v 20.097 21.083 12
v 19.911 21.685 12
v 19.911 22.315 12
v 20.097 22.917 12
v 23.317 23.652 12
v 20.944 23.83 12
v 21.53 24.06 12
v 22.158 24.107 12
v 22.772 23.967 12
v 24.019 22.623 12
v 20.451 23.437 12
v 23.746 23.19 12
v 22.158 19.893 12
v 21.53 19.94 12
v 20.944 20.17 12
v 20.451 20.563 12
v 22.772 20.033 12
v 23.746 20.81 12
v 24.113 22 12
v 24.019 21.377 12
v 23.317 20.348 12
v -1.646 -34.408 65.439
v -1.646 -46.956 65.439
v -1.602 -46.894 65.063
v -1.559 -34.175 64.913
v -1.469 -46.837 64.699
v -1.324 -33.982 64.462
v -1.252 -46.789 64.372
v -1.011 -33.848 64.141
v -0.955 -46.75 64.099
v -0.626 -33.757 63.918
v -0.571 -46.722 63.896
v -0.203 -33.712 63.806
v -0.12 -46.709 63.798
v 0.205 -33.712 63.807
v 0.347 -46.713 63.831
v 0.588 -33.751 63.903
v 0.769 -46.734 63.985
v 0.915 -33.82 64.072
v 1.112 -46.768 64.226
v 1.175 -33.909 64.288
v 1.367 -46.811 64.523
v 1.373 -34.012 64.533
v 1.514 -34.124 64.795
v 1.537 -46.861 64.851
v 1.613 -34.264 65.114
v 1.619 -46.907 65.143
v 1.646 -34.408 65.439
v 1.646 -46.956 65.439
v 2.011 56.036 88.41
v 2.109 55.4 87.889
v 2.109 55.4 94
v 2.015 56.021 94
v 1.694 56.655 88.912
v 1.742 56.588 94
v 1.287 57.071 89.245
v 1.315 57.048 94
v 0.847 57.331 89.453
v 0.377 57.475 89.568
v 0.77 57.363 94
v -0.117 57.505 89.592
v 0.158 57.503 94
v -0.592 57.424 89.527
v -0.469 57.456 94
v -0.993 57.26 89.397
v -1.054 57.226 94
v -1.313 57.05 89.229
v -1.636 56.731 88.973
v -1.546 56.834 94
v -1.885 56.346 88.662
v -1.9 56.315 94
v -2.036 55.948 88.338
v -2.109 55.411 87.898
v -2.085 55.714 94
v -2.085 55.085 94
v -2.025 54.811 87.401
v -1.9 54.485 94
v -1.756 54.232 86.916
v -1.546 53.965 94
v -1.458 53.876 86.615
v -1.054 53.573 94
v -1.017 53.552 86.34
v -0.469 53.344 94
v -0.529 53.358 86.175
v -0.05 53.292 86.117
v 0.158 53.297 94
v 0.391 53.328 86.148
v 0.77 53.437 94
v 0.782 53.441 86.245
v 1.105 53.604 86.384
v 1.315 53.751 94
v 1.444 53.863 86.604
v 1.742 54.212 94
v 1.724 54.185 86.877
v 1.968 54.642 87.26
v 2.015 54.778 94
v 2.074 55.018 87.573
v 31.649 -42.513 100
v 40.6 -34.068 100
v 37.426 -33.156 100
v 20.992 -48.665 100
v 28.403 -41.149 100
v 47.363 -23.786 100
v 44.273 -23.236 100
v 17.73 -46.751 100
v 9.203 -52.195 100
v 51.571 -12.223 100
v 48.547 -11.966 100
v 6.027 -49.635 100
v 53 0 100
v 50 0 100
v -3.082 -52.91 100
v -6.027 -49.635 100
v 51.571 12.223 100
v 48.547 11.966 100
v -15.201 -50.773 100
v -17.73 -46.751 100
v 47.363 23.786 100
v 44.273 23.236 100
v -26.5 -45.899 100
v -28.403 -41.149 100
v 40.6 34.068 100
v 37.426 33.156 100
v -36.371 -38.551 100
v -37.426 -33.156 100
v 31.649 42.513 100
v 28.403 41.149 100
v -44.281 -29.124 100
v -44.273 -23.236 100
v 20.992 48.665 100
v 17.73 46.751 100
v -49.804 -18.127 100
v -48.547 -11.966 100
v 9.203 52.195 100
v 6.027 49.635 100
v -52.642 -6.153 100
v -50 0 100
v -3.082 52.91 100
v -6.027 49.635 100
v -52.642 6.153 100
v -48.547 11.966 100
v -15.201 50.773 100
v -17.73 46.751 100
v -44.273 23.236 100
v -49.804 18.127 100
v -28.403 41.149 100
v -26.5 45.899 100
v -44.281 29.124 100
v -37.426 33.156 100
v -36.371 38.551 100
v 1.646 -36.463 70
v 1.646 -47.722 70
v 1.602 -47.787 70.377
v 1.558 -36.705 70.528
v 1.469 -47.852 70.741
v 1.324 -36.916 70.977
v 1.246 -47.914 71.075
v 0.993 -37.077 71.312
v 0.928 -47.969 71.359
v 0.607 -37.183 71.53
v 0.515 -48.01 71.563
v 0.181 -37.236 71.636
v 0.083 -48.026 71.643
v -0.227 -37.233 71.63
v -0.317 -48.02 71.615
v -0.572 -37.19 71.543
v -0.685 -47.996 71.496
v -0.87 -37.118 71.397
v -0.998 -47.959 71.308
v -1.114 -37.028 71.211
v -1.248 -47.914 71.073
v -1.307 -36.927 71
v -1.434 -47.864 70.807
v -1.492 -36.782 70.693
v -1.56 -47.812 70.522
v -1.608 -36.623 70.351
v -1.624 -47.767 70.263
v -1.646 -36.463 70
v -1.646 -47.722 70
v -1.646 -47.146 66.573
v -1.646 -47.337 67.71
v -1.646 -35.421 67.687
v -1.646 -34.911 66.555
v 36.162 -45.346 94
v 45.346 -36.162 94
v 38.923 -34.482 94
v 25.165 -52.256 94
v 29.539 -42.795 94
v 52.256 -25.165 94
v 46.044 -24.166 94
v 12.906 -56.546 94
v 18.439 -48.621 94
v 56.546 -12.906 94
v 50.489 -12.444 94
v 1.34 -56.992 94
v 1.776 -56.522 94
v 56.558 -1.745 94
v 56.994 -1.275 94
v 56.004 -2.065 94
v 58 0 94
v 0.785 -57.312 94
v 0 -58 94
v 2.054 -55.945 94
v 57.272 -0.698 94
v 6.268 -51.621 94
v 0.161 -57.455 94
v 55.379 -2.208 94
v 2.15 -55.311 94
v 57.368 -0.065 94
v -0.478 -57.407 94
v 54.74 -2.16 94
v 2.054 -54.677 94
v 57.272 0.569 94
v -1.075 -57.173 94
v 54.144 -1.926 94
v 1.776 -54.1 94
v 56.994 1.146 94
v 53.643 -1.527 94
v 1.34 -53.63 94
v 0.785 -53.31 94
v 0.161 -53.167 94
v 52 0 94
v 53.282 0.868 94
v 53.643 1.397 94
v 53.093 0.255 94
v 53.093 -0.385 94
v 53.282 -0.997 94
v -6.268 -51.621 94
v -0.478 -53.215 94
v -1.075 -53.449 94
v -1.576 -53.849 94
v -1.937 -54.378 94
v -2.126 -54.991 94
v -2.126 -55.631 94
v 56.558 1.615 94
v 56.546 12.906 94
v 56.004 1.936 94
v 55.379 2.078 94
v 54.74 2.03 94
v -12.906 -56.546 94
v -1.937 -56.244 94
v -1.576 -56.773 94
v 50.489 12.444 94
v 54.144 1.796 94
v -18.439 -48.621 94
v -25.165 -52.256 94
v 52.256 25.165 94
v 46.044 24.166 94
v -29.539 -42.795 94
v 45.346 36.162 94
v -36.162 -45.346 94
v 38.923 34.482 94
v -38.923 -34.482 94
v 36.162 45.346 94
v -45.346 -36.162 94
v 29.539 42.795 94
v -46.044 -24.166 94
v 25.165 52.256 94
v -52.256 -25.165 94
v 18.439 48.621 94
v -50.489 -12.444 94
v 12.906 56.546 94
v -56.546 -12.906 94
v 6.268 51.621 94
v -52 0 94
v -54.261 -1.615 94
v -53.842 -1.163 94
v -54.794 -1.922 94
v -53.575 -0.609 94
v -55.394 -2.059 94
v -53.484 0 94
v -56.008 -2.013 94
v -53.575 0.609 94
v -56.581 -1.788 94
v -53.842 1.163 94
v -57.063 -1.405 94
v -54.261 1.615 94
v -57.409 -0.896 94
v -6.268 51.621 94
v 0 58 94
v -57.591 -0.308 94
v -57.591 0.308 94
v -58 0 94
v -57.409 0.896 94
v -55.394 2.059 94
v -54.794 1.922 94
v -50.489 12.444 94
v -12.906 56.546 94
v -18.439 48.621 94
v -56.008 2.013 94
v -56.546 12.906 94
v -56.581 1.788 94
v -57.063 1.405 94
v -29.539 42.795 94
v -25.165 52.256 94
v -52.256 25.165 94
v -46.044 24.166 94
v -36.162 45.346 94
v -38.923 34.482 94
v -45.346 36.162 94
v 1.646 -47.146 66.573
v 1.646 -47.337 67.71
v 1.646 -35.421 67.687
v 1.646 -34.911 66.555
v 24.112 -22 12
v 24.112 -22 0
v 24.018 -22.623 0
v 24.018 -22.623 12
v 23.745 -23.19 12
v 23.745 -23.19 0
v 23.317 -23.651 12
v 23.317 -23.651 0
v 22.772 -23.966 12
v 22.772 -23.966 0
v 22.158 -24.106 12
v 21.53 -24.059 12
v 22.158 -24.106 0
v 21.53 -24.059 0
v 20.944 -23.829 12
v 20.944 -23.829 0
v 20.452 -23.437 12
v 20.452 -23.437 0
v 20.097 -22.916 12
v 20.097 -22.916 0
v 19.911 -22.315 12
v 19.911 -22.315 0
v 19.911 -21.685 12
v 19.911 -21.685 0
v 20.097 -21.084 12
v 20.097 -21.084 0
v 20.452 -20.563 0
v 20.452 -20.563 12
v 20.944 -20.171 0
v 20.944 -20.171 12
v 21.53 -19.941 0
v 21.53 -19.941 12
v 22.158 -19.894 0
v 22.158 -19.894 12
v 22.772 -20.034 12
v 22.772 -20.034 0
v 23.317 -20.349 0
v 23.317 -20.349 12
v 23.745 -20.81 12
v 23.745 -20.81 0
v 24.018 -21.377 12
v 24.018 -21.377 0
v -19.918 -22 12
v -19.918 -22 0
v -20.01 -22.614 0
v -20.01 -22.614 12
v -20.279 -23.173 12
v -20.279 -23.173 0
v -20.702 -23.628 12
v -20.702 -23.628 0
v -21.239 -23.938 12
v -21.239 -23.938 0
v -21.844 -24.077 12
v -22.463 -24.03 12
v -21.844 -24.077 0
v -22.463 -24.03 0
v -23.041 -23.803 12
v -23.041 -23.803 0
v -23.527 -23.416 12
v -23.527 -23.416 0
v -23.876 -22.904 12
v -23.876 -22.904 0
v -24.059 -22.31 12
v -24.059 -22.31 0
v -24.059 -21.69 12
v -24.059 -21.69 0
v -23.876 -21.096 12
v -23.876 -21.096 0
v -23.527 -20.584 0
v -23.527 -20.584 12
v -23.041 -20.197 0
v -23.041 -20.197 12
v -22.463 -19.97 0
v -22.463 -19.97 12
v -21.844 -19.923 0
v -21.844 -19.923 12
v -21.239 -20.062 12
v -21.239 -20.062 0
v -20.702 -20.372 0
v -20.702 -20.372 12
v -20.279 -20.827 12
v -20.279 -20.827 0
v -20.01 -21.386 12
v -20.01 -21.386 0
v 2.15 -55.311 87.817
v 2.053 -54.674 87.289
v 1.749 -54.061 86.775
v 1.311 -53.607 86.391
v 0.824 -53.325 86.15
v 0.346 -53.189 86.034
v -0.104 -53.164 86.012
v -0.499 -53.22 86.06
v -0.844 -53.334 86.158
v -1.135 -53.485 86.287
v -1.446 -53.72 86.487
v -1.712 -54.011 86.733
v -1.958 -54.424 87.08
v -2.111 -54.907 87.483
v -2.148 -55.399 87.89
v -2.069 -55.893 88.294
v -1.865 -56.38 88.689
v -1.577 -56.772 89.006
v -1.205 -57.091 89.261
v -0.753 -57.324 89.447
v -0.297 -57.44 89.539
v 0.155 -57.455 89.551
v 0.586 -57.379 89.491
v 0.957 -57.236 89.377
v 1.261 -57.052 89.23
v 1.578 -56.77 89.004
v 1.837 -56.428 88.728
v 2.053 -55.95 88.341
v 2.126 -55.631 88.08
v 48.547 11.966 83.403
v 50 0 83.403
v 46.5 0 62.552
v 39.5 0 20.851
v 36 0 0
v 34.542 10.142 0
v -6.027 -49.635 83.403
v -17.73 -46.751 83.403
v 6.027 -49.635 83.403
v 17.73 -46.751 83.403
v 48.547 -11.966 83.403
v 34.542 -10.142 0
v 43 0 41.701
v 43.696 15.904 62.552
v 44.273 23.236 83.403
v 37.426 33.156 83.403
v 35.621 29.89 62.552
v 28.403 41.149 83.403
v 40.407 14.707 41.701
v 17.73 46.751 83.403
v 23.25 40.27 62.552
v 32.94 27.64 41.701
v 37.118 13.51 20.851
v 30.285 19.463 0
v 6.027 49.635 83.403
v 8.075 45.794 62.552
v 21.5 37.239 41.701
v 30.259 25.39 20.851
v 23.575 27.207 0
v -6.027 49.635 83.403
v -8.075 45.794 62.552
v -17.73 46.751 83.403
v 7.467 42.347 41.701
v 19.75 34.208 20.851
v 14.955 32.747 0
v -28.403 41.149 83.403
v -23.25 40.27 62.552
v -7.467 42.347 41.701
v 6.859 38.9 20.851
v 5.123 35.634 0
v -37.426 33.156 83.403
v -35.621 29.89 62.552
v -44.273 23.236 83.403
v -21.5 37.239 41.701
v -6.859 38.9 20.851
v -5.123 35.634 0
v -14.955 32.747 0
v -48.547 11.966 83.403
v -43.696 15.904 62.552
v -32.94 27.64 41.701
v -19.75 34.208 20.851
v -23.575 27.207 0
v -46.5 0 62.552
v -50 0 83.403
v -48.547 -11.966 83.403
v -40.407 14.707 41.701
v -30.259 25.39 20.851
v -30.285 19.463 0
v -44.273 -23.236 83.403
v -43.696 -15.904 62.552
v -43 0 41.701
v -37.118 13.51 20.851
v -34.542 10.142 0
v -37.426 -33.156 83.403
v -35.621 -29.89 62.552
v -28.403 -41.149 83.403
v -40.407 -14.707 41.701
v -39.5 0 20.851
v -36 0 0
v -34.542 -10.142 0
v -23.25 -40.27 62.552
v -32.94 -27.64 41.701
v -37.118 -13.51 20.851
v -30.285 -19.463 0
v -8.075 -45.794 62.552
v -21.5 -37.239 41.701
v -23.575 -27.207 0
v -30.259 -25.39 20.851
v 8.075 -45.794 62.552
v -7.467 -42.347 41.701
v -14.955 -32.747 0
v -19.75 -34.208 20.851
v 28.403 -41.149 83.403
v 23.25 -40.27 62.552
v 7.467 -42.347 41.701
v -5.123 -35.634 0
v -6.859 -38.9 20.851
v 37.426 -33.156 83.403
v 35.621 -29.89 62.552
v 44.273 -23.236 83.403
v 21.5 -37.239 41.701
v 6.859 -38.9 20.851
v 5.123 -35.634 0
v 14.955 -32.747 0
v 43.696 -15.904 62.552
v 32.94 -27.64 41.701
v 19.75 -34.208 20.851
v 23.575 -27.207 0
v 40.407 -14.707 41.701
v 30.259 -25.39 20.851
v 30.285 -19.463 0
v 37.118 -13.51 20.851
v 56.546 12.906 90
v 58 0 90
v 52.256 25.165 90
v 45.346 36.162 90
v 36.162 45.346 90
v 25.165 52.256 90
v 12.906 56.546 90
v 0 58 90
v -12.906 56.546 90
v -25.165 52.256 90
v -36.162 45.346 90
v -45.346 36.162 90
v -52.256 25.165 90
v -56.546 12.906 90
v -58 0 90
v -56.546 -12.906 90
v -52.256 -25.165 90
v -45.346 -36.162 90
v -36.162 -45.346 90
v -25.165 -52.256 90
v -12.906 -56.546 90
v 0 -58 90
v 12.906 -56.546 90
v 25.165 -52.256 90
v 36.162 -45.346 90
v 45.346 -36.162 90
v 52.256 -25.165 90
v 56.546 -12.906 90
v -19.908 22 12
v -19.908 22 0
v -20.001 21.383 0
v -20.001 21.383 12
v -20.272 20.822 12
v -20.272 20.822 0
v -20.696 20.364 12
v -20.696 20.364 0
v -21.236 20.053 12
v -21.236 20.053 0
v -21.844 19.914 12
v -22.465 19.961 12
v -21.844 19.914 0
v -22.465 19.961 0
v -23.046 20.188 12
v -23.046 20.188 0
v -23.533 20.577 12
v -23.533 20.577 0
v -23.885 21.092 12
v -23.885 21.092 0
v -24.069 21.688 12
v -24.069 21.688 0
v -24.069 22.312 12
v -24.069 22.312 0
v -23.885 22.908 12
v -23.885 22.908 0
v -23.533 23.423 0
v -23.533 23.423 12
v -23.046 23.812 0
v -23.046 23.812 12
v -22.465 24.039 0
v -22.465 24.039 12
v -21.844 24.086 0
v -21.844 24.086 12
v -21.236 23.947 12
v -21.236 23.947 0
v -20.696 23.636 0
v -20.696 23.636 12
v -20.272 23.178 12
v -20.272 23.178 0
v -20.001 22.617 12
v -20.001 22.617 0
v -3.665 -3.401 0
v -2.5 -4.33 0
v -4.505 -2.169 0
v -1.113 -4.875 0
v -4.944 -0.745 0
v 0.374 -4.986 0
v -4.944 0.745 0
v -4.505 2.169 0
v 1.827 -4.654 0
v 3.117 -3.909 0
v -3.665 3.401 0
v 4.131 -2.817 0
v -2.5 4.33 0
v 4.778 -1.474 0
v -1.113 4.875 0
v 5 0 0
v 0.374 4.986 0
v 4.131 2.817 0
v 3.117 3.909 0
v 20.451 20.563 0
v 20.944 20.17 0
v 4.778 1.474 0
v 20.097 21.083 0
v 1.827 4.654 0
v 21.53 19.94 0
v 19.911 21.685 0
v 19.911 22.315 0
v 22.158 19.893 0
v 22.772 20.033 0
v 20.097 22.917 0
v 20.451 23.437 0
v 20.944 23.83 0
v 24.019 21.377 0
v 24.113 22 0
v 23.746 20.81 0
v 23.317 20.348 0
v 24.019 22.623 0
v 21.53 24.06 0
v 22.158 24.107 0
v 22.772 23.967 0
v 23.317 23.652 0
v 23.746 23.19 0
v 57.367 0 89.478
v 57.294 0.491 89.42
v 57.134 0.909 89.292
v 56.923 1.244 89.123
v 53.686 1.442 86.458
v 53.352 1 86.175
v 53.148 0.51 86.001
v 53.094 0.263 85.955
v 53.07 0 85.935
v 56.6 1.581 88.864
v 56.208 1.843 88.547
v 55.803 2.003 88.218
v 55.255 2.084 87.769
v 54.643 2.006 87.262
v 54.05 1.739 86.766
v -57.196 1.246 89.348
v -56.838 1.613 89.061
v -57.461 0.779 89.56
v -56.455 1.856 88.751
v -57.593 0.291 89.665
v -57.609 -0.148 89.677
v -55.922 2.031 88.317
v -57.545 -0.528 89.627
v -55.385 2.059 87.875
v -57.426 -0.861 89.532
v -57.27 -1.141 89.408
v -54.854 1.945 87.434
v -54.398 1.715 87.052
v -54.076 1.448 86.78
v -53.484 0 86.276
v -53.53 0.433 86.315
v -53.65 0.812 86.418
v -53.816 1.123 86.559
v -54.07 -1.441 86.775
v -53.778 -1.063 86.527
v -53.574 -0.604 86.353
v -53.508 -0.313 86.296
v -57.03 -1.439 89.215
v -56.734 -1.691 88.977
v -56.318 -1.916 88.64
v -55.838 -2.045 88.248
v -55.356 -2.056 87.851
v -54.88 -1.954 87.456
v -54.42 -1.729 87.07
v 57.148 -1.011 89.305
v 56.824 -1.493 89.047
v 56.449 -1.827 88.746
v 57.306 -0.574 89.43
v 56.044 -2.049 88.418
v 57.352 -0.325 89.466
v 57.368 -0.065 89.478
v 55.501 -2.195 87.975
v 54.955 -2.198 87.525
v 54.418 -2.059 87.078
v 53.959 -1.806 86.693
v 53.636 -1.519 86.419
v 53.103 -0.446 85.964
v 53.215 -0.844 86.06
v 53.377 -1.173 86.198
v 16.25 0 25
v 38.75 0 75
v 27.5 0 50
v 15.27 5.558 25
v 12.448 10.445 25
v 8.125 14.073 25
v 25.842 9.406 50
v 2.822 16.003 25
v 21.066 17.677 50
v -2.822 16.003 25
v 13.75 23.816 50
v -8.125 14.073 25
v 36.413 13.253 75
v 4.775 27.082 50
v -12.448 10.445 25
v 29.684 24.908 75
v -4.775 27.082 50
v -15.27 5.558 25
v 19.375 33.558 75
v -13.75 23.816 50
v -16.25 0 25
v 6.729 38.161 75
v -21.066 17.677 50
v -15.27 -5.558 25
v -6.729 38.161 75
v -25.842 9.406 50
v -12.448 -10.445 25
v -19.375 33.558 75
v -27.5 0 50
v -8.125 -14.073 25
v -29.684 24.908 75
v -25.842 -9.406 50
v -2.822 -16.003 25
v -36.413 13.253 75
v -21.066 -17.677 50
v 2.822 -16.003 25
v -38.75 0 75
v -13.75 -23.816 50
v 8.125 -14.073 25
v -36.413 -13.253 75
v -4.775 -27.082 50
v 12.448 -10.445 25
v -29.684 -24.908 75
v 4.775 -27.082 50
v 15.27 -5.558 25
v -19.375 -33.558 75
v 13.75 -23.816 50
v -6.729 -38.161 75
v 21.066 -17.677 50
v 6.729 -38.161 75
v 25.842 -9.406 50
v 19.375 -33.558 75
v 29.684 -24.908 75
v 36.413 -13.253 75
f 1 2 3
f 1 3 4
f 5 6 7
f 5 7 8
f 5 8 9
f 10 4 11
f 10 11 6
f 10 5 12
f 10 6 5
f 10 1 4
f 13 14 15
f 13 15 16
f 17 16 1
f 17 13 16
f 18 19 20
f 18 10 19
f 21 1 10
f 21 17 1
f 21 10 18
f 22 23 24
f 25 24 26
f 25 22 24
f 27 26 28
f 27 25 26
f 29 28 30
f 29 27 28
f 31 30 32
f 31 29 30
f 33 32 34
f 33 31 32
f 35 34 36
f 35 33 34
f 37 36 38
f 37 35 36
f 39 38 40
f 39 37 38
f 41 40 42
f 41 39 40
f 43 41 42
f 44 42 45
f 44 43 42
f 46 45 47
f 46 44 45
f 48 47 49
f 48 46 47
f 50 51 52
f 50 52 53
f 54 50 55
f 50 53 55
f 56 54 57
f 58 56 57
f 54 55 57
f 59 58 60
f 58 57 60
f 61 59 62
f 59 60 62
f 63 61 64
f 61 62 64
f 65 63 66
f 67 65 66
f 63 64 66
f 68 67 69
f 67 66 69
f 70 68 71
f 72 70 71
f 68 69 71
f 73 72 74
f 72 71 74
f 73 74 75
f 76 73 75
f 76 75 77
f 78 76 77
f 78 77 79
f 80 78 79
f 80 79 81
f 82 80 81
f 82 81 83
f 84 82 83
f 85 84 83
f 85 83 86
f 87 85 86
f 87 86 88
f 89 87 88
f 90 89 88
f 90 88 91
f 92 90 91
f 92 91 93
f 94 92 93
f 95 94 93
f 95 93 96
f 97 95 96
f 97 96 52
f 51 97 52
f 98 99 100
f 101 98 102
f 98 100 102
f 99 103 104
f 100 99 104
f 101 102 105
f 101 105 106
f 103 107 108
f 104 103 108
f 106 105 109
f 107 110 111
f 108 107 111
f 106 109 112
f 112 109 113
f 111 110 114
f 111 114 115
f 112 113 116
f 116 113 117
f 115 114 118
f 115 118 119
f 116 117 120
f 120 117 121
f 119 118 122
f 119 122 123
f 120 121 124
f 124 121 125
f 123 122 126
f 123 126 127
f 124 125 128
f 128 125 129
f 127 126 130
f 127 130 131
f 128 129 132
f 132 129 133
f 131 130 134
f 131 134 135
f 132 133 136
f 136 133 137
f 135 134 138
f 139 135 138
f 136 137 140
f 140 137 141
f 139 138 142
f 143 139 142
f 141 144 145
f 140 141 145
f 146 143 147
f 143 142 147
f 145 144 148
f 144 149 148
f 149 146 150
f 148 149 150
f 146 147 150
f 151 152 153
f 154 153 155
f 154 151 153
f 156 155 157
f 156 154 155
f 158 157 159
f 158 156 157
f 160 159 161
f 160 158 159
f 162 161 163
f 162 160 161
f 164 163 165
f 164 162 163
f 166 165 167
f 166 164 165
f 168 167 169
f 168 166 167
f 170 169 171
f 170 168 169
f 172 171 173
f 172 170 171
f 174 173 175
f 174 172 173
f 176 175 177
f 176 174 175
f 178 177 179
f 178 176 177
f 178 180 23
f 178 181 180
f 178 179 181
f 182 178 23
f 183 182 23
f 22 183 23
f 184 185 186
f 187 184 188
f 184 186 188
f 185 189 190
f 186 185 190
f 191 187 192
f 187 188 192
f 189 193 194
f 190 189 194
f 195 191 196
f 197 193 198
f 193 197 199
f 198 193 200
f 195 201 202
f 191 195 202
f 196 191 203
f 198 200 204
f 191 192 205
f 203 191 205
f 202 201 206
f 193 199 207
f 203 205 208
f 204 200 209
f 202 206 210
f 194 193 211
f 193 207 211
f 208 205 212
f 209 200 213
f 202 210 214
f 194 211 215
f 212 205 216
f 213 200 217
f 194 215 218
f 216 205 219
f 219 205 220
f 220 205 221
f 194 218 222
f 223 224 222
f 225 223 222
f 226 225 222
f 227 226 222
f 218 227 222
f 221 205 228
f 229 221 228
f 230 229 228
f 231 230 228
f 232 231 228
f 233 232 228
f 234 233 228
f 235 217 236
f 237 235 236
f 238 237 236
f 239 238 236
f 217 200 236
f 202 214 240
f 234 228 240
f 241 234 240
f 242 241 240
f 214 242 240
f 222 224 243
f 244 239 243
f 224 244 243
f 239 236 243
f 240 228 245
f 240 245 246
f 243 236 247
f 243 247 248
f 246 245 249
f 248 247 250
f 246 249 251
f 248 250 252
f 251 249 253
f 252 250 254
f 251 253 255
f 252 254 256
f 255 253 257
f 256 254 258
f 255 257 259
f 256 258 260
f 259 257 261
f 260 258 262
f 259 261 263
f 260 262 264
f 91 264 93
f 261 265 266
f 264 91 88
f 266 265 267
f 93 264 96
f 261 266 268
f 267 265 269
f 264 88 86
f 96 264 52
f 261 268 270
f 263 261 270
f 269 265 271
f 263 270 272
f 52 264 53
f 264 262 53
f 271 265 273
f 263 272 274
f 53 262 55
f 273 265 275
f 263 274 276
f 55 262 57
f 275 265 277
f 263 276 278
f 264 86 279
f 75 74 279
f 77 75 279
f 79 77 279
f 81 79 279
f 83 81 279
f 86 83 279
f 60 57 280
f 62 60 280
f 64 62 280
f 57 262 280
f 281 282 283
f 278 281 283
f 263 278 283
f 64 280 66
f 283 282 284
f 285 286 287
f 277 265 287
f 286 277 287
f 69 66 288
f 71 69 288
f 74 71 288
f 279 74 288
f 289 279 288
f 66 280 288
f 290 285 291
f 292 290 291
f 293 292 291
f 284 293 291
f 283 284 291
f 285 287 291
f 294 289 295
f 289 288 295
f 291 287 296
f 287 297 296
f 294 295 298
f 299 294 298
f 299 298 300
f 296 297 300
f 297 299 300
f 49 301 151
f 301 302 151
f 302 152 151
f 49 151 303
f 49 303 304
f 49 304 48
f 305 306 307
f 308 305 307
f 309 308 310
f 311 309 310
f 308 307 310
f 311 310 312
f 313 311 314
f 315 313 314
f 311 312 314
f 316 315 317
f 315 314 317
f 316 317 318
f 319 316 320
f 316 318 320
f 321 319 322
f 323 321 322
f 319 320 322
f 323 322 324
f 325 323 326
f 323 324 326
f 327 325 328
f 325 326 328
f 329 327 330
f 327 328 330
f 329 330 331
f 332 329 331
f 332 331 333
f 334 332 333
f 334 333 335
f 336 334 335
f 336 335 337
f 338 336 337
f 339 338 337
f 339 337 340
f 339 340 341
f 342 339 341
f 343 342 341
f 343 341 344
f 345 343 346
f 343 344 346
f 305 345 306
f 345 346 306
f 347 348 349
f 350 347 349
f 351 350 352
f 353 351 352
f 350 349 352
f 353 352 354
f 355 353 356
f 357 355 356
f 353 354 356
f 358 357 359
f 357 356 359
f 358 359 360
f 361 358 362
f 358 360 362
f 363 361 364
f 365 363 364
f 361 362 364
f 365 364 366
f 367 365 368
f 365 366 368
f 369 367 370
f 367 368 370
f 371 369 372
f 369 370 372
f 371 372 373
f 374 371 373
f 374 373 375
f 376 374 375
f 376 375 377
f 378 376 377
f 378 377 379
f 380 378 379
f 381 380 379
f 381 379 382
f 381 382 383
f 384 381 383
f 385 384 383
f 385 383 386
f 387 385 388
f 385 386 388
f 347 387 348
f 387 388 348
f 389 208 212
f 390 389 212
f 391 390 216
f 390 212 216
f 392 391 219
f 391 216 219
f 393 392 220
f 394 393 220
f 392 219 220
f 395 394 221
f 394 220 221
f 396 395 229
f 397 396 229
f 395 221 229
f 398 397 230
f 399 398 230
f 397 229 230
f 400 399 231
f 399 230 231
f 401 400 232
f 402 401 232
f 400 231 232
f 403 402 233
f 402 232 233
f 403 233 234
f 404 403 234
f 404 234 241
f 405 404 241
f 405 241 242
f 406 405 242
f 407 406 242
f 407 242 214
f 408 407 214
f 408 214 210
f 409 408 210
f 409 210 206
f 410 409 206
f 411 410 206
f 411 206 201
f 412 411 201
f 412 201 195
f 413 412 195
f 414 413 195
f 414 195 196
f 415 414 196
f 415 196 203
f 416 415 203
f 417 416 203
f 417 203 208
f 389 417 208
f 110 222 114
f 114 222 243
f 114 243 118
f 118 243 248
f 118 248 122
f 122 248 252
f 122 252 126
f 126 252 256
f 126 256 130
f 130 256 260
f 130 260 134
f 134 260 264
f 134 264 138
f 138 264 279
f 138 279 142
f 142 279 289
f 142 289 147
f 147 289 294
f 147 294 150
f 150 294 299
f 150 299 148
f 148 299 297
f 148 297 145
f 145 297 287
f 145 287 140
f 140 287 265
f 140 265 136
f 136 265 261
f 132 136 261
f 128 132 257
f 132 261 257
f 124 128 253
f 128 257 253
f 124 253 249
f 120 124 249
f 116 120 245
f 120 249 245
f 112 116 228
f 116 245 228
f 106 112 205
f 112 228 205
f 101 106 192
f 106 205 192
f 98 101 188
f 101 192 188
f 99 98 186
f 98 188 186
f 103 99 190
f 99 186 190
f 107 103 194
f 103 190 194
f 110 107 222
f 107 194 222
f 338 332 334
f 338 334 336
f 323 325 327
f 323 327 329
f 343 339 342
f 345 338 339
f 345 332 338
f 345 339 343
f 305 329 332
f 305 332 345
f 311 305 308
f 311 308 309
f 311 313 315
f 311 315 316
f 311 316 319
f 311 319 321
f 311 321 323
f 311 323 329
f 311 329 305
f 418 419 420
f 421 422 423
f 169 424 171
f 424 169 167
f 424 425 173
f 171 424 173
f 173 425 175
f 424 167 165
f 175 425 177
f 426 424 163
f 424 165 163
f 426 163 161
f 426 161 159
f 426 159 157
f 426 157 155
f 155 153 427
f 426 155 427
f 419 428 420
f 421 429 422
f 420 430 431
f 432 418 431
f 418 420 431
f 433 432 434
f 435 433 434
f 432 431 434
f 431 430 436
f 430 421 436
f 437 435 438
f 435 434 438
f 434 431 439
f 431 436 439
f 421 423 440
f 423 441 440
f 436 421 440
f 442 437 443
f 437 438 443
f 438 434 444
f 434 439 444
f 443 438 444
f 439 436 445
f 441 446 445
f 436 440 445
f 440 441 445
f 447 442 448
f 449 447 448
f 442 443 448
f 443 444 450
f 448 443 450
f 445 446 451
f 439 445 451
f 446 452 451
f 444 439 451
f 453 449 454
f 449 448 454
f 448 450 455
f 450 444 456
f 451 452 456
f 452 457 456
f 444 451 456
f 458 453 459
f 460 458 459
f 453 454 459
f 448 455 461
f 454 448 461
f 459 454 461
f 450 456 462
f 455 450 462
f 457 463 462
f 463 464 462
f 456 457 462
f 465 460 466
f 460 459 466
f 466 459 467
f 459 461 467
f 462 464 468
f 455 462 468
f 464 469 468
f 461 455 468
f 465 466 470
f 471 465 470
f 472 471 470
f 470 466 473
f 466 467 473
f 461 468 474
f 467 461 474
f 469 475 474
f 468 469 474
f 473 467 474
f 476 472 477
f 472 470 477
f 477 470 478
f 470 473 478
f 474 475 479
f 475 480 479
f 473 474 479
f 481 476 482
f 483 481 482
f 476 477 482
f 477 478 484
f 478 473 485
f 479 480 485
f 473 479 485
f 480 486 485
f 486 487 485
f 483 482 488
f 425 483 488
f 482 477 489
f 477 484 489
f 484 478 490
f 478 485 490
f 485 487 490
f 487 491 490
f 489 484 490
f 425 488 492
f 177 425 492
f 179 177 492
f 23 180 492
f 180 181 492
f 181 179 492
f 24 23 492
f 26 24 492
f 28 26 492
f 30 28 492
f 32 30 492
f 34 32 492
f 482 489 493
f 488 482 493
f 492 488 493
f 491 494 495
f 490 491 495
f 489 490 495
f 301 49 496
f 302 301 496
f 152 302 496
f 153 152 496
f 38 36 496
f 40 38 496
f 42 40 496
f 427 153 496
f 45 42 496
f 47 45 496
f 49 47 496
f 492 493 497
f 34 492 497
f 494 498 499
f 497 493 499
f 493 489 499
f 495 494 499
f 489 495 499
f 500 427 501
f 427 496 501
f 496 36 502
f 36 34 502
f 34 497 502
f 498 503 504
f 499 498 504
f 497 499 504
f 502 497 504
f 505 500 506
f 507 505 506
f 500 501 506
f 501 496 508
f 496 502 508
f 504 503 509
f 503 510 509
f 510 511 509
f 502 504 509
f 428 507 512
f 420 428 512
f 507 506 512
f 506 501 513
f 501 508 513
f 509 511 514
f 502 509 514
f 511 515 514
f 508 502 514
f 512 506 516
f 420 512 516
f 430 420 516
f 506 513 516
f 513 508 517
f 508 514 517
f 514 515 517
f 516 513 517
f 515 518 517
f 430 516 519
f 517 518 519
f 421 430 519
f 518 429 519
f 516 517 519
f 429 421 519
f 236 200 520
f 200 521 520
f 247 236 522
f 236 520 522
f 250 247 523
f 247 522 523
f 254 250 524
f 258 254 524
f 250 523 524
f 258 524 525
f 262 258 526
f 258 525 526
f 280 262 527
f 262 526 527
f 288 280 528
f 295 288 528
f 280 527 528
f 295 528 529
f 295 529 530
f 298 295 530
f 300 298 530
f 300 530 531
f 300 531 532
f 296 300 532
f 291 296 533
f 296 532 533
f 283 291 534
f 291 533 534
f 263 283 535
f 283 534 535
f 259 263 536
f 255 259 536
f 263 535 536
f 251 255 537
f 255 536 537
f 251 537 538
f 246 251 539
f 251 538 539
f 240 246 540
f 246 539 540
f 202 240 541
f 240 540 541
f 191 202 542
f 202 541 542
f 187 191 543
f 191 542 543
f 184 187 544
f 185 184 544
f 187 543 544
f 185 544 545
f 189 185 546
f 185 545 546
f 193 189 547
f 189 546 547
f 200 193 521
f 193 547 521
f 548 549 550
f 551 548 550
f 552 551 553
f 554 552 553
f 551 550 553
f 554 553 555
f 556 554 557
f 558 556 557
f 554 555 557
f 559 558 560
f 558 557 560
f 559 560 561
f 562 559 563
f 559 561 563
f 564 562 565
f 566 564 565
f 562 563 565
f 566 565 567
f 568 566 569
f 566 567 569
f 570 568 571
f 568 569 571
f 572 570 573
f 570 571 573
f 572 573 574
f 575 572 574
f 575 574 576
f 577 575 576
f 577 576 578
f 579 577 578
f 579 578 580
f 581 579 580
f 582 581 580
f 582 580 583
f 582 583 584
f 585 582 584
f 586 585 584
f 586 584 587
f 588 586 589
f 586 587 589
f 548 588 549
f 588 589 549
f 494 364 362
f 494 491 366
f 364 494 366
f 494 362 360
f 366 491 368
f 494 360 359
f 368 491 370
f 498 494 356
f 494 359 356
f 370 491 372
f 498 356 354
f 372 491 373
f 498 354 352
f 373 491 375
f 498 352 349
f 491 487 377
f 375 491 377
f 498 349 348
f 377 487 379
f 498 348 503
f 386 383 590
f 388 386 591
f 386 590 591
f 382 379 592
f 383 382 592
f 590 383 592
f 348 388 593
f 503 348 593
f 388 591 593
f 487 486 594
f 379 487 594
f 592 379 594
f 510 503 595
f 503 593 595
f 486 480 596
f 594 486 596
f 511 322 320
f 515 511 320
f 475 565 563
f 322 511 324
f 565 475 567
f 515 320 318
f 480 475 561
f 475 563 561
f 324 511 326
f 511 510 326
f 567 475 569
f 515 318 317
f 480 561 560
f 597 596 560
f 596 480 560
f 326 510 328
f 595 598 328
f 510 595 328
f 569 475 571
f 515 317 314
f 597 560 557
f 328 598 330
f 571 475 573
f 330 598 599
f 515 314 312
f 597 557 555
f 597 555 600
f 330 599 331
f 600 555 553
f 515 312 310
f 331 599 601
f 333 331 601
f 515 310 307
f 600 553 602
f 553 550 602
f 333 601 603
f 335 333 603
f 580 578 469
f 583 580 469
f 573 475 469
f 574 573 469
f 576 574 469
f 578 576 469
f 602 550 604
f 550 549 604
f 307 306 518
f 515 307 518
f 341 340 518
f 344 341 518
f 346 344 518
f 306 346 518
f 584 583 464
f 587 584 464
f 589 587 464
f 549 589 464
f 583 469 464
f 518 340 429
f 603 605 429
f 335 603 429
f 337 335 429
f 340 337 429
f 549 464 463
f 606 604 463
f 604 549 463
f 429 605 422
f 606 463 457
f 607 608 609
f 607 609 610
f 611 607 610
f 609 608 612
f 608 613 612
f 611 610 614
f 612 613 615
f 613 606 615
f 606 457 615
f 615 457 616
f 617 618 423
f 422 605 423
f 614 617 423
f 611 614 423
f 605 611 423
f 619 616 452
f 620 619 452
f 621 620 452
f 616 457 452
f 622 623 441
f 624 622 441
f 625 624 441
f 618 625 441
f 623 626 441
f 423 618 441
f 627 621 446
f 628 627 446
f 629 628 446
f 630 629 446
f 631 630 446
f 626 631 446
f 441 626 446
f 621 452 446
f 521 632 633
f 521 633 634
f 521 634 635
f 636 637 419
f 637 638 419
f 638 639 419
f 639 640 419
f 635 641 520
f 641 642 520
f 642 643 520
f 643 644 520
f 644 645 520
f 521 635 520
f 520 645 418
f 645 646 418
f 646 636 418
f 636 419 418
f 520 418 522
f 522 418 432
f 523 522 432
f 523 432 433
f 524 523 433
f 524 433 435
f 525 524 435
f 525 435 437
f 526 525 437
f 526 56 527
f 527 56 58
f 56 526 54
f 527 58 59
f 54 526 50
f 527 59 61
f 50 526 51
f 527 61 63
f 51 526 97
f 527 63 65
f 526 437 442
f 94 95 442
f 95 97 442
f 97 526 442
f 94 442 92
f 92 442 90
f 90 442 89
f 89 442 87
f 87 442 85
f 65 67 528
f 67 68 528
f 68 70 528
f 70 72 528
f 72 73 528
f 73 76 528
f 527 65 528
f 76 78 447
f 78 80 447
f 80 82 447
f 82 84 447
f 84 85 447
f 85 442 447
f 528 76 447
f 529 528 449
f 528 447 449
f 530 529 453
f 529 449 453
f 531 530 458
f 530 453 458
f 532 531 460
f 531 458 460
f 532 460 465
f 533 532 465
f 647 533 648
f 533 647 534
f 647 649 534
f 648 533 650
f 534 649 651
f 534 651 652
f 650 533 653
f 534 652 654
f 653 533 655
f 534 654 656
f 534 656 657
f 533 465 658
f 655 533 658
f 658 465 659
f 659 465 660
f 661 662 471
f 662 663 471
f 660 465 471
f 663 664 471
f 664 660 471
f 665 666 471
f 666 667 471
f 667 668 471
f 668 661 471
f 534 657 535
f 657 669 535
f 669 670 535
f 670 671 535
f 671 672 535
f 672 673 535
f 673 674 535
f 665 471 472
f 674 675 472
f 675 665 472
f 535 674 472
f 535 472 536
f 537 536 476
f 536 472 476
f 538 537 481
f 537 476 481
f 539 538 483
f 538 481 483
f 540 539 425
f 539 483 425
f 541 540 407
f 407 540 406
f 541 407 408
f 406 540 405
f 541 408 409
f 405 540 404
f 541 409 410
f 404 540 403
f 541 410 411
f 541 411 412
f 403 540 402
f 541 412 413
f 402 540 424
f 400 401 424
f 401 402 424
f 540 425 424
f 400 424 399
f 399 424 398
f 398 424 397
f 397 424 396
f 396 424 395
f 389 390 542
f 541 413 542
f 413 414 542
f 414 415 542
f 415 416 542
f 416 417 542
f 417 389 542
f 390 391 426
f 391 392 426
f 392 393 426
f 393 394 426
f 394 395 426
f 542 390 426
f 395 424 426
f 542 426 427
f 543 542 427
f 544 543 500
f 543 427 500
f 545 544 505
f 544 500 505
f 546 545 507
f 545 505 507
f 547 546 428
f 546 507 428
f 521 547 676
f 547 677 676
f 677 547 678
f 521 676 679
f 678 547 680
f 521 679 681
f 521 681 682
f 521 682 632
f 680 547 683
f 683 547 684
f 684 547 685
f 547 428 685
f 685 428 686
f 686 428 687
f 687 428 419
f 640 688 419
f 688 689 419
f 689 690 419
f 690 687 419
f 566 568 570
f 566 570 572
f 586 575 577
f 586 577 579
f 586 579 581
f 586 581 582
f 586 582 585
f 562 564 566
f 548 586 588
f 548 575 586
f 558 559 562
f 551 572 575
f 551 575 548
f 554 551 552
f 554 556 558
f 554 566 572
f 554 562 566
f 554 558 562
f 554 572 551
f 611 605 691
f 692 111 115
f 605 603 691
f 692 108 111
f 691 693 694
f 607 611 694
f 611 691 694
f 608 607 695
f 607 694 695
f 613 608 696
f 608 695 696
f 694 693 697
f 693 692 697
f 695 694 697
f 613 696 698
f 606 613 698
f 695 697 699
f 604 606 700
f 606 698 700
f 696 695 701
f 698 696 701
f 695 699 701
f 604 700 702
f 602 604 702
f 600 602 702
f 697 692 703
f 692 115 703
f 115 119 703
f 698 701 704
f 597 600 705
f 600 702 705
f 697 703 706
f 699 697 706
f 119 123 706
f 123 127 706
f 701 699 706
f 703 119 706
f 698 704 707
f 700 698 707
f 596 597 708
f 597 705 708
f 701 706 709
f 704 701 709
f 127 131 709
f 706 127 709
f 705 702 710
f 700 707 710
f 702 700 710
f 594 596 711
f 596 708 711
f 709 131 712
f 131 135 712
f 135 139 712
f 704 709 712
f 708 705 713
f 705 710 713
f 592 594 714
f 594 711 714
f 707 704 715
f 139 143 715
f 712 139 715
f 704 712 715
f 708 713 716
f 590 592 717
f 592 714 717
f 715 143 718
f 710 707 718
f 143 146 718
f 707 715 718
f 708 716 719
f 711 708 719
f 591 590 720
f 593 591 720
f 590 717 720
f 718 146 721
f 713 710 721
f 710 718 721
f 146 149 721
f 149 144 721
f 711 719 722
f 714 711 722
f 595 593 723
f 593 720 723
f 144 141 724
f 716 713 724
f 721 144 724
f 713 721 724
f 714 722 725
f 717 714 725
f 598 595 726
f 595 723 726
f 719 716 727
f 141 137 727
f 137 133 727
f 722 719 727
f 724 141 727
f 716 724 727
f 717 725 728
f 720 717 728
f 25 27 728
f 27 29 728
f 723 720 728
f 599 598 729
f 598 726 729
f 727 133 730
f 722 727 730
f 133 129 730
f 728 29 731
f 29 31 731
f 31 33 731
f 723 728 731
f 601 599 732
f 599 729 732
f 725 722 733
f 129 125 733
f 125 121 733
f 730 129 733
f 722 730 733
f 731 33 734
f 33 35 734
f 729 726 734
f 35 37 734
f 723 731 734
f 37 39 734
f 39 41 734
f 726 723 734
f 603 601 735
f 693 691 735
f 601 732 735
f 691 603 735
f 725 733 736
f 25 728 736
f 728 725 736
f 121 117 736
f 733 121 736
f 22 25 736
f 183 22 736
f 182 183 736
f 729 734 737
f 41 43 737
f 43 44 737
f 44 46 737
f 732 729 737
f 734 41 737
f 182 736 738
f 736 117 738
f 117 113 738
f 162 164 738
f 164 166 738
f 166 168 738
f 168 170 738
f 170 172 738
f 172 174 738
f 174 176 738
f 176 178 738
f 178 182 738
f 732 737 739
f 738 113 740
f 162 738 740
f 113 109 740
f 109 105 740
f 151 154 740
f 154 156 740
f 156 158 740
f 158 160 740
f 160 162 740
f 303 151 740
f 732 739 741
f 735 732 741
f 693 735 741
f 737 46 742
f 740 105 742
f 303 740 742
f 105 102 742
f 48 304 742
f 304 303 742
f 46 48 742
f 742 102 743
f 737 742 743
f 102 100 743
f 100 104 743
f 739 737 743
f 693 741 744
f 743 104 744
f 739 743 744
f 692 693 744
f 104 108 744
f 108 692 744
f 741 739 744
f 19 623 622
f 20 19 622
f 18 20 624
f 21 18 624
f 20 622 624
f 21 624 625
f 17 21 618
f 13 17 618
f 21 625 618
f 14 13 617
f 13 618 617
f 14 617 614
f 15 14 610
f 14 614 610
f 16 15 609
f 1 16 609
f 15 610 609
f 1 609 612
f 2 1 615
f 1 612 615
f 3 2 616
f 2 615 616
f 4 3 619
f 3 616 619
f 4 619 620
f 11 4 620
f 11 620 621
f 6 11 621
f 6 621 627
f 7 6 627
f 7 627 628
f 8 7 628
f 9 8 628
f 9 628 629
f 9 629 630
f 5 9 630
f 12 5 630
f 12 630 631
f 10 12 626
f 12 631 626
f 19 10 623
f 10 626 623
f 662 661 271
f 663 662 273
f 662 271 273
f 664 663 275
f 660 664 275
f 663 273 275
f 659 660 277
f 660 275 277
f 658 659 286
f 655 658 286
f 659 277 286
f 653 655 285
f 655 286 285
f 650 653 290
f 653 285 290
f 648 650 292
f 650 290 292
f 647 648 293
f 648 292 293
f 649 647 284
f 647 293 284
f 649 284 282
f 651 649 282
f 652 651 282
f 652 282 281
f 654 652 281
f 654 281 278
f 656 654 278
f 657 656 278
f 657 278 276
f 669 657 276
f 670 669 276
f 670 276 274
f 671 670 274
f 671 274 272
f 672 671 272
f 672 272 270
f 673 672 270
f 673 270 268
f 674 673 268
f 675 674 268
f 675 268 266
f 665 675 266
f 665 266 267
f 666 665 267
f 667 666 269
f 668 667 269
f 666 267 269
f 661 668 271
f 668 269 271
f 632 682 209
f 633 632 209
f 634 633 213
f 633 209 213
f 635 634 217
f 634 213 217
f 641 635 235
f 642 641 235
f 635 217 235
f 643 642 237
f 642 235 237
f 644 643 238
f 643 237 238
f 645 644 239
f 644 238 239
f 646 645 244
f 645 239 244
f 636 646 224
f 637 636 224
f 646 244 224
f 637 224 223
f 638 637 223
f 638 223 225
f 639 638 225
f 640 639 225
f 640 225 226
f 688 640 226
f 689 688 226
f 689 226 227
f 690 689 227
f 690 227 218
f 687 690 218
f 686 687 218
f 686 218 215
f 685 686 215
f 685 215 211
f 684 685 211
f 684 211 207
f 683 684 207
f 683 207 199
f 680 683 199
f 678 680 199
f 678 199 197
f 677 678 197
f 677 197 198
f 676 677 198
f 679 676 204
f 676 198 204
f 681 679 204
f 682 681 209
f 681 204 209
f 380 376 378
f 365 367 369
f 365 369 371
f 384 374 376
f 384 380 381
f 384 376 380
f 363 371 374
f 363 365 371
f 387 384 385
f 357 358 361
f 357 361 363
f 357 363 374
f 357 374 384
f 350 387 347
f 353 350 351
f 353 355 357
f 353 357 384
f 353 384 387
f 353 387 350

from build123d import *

# Parameters (mm, degrees)
PAD_DEPTH       = 50
SKETCH_R        = 2.112176
SKETCH_R_2      = 2.082394
SKETCH_R_3      = 2.112641
SKETCH_R_4      = 2.091899
POCKET001_DEPTH = 12
SKETCH005_R     = 2.149119
SKETCH005_R_2   = 2.108774
SKETCH005_R_3   = 2.065142
SKETCH005_R_4   = 2.149709
POCKET002_DEPTH = 15


with BuildPart() as pad:
    # Sketch004 → Pad (new body)
    with BuildSketch(Plane.XZ):
        with BuildLine():
            ThreePointArc((1.645506, 70), (0, 71.645506), (-1.645506, 70))
            Line((-1.645506, 70), (-1.645506, 65.439445))
            ThreePointArc((-1.645506, 65.439445), (0, 63.793939), (1.645506, 65.439445))
            Line((1.645506, 70), (1.645506, 65.439445))
        make_face()
    extrude(amount=PAD_DEPTH)


with BuildPart() as assemblya_funnel:
    # Sketch003 → Revolution001 (revolve)
    with BuildSketch(Plane.XZ):
        Polygon((5, 0), (50, 100), (53, 100), (52, 94), (58, 94), (58, 90), (50, 83.40284), (36, 0), align=None)
    revolve(axis=Axis((0, 0, 0), (0, 0, 1)))

    # Sketch → Pocket001 (cut)
    with BuildSketch(Plane(origin=(0, 0, 0), x_dir=(1, 0, 0), z_dir=(0, 0, -1))):
        with Locations((22, 22)):
            Circle(SKETCH_R)
        with Locations((-22, 22)):
            Circle(SKETCH_R_2)
        with Locations((22, -22)):
            Circle(SKETCH_R_3)
        with Locations((-22, -22)):
            Circle(SKETCH_R_4)
    extrude(amount=-POCKET001_DEPTH, mode=Mode.SUBTRACT)

    # Cut: cut Pad
    add(pad.part, mode=Mode.SUBTRACT)

    # Sketch005 → Pocket002 (cut)
    with BuildSketch(Plane.XY.offset(94)):
        with Locations((55.218414, -0.064825)):
            Circle(SKETCH005_R)
        with Locations((0, 55.39975)):
            Circle(SKETCH005_R_2)
        with Locations((-55.548775, 0)):
            Circle(SKETCH005_R_3)
        with Locations((0, -55.311054)):
            Circle(SKETCH005_R_4)
    extrude(amount=-POCKET002_DEPTH, mode=Mode.SUBTRACT)


solid = assemblya_funnel.part
